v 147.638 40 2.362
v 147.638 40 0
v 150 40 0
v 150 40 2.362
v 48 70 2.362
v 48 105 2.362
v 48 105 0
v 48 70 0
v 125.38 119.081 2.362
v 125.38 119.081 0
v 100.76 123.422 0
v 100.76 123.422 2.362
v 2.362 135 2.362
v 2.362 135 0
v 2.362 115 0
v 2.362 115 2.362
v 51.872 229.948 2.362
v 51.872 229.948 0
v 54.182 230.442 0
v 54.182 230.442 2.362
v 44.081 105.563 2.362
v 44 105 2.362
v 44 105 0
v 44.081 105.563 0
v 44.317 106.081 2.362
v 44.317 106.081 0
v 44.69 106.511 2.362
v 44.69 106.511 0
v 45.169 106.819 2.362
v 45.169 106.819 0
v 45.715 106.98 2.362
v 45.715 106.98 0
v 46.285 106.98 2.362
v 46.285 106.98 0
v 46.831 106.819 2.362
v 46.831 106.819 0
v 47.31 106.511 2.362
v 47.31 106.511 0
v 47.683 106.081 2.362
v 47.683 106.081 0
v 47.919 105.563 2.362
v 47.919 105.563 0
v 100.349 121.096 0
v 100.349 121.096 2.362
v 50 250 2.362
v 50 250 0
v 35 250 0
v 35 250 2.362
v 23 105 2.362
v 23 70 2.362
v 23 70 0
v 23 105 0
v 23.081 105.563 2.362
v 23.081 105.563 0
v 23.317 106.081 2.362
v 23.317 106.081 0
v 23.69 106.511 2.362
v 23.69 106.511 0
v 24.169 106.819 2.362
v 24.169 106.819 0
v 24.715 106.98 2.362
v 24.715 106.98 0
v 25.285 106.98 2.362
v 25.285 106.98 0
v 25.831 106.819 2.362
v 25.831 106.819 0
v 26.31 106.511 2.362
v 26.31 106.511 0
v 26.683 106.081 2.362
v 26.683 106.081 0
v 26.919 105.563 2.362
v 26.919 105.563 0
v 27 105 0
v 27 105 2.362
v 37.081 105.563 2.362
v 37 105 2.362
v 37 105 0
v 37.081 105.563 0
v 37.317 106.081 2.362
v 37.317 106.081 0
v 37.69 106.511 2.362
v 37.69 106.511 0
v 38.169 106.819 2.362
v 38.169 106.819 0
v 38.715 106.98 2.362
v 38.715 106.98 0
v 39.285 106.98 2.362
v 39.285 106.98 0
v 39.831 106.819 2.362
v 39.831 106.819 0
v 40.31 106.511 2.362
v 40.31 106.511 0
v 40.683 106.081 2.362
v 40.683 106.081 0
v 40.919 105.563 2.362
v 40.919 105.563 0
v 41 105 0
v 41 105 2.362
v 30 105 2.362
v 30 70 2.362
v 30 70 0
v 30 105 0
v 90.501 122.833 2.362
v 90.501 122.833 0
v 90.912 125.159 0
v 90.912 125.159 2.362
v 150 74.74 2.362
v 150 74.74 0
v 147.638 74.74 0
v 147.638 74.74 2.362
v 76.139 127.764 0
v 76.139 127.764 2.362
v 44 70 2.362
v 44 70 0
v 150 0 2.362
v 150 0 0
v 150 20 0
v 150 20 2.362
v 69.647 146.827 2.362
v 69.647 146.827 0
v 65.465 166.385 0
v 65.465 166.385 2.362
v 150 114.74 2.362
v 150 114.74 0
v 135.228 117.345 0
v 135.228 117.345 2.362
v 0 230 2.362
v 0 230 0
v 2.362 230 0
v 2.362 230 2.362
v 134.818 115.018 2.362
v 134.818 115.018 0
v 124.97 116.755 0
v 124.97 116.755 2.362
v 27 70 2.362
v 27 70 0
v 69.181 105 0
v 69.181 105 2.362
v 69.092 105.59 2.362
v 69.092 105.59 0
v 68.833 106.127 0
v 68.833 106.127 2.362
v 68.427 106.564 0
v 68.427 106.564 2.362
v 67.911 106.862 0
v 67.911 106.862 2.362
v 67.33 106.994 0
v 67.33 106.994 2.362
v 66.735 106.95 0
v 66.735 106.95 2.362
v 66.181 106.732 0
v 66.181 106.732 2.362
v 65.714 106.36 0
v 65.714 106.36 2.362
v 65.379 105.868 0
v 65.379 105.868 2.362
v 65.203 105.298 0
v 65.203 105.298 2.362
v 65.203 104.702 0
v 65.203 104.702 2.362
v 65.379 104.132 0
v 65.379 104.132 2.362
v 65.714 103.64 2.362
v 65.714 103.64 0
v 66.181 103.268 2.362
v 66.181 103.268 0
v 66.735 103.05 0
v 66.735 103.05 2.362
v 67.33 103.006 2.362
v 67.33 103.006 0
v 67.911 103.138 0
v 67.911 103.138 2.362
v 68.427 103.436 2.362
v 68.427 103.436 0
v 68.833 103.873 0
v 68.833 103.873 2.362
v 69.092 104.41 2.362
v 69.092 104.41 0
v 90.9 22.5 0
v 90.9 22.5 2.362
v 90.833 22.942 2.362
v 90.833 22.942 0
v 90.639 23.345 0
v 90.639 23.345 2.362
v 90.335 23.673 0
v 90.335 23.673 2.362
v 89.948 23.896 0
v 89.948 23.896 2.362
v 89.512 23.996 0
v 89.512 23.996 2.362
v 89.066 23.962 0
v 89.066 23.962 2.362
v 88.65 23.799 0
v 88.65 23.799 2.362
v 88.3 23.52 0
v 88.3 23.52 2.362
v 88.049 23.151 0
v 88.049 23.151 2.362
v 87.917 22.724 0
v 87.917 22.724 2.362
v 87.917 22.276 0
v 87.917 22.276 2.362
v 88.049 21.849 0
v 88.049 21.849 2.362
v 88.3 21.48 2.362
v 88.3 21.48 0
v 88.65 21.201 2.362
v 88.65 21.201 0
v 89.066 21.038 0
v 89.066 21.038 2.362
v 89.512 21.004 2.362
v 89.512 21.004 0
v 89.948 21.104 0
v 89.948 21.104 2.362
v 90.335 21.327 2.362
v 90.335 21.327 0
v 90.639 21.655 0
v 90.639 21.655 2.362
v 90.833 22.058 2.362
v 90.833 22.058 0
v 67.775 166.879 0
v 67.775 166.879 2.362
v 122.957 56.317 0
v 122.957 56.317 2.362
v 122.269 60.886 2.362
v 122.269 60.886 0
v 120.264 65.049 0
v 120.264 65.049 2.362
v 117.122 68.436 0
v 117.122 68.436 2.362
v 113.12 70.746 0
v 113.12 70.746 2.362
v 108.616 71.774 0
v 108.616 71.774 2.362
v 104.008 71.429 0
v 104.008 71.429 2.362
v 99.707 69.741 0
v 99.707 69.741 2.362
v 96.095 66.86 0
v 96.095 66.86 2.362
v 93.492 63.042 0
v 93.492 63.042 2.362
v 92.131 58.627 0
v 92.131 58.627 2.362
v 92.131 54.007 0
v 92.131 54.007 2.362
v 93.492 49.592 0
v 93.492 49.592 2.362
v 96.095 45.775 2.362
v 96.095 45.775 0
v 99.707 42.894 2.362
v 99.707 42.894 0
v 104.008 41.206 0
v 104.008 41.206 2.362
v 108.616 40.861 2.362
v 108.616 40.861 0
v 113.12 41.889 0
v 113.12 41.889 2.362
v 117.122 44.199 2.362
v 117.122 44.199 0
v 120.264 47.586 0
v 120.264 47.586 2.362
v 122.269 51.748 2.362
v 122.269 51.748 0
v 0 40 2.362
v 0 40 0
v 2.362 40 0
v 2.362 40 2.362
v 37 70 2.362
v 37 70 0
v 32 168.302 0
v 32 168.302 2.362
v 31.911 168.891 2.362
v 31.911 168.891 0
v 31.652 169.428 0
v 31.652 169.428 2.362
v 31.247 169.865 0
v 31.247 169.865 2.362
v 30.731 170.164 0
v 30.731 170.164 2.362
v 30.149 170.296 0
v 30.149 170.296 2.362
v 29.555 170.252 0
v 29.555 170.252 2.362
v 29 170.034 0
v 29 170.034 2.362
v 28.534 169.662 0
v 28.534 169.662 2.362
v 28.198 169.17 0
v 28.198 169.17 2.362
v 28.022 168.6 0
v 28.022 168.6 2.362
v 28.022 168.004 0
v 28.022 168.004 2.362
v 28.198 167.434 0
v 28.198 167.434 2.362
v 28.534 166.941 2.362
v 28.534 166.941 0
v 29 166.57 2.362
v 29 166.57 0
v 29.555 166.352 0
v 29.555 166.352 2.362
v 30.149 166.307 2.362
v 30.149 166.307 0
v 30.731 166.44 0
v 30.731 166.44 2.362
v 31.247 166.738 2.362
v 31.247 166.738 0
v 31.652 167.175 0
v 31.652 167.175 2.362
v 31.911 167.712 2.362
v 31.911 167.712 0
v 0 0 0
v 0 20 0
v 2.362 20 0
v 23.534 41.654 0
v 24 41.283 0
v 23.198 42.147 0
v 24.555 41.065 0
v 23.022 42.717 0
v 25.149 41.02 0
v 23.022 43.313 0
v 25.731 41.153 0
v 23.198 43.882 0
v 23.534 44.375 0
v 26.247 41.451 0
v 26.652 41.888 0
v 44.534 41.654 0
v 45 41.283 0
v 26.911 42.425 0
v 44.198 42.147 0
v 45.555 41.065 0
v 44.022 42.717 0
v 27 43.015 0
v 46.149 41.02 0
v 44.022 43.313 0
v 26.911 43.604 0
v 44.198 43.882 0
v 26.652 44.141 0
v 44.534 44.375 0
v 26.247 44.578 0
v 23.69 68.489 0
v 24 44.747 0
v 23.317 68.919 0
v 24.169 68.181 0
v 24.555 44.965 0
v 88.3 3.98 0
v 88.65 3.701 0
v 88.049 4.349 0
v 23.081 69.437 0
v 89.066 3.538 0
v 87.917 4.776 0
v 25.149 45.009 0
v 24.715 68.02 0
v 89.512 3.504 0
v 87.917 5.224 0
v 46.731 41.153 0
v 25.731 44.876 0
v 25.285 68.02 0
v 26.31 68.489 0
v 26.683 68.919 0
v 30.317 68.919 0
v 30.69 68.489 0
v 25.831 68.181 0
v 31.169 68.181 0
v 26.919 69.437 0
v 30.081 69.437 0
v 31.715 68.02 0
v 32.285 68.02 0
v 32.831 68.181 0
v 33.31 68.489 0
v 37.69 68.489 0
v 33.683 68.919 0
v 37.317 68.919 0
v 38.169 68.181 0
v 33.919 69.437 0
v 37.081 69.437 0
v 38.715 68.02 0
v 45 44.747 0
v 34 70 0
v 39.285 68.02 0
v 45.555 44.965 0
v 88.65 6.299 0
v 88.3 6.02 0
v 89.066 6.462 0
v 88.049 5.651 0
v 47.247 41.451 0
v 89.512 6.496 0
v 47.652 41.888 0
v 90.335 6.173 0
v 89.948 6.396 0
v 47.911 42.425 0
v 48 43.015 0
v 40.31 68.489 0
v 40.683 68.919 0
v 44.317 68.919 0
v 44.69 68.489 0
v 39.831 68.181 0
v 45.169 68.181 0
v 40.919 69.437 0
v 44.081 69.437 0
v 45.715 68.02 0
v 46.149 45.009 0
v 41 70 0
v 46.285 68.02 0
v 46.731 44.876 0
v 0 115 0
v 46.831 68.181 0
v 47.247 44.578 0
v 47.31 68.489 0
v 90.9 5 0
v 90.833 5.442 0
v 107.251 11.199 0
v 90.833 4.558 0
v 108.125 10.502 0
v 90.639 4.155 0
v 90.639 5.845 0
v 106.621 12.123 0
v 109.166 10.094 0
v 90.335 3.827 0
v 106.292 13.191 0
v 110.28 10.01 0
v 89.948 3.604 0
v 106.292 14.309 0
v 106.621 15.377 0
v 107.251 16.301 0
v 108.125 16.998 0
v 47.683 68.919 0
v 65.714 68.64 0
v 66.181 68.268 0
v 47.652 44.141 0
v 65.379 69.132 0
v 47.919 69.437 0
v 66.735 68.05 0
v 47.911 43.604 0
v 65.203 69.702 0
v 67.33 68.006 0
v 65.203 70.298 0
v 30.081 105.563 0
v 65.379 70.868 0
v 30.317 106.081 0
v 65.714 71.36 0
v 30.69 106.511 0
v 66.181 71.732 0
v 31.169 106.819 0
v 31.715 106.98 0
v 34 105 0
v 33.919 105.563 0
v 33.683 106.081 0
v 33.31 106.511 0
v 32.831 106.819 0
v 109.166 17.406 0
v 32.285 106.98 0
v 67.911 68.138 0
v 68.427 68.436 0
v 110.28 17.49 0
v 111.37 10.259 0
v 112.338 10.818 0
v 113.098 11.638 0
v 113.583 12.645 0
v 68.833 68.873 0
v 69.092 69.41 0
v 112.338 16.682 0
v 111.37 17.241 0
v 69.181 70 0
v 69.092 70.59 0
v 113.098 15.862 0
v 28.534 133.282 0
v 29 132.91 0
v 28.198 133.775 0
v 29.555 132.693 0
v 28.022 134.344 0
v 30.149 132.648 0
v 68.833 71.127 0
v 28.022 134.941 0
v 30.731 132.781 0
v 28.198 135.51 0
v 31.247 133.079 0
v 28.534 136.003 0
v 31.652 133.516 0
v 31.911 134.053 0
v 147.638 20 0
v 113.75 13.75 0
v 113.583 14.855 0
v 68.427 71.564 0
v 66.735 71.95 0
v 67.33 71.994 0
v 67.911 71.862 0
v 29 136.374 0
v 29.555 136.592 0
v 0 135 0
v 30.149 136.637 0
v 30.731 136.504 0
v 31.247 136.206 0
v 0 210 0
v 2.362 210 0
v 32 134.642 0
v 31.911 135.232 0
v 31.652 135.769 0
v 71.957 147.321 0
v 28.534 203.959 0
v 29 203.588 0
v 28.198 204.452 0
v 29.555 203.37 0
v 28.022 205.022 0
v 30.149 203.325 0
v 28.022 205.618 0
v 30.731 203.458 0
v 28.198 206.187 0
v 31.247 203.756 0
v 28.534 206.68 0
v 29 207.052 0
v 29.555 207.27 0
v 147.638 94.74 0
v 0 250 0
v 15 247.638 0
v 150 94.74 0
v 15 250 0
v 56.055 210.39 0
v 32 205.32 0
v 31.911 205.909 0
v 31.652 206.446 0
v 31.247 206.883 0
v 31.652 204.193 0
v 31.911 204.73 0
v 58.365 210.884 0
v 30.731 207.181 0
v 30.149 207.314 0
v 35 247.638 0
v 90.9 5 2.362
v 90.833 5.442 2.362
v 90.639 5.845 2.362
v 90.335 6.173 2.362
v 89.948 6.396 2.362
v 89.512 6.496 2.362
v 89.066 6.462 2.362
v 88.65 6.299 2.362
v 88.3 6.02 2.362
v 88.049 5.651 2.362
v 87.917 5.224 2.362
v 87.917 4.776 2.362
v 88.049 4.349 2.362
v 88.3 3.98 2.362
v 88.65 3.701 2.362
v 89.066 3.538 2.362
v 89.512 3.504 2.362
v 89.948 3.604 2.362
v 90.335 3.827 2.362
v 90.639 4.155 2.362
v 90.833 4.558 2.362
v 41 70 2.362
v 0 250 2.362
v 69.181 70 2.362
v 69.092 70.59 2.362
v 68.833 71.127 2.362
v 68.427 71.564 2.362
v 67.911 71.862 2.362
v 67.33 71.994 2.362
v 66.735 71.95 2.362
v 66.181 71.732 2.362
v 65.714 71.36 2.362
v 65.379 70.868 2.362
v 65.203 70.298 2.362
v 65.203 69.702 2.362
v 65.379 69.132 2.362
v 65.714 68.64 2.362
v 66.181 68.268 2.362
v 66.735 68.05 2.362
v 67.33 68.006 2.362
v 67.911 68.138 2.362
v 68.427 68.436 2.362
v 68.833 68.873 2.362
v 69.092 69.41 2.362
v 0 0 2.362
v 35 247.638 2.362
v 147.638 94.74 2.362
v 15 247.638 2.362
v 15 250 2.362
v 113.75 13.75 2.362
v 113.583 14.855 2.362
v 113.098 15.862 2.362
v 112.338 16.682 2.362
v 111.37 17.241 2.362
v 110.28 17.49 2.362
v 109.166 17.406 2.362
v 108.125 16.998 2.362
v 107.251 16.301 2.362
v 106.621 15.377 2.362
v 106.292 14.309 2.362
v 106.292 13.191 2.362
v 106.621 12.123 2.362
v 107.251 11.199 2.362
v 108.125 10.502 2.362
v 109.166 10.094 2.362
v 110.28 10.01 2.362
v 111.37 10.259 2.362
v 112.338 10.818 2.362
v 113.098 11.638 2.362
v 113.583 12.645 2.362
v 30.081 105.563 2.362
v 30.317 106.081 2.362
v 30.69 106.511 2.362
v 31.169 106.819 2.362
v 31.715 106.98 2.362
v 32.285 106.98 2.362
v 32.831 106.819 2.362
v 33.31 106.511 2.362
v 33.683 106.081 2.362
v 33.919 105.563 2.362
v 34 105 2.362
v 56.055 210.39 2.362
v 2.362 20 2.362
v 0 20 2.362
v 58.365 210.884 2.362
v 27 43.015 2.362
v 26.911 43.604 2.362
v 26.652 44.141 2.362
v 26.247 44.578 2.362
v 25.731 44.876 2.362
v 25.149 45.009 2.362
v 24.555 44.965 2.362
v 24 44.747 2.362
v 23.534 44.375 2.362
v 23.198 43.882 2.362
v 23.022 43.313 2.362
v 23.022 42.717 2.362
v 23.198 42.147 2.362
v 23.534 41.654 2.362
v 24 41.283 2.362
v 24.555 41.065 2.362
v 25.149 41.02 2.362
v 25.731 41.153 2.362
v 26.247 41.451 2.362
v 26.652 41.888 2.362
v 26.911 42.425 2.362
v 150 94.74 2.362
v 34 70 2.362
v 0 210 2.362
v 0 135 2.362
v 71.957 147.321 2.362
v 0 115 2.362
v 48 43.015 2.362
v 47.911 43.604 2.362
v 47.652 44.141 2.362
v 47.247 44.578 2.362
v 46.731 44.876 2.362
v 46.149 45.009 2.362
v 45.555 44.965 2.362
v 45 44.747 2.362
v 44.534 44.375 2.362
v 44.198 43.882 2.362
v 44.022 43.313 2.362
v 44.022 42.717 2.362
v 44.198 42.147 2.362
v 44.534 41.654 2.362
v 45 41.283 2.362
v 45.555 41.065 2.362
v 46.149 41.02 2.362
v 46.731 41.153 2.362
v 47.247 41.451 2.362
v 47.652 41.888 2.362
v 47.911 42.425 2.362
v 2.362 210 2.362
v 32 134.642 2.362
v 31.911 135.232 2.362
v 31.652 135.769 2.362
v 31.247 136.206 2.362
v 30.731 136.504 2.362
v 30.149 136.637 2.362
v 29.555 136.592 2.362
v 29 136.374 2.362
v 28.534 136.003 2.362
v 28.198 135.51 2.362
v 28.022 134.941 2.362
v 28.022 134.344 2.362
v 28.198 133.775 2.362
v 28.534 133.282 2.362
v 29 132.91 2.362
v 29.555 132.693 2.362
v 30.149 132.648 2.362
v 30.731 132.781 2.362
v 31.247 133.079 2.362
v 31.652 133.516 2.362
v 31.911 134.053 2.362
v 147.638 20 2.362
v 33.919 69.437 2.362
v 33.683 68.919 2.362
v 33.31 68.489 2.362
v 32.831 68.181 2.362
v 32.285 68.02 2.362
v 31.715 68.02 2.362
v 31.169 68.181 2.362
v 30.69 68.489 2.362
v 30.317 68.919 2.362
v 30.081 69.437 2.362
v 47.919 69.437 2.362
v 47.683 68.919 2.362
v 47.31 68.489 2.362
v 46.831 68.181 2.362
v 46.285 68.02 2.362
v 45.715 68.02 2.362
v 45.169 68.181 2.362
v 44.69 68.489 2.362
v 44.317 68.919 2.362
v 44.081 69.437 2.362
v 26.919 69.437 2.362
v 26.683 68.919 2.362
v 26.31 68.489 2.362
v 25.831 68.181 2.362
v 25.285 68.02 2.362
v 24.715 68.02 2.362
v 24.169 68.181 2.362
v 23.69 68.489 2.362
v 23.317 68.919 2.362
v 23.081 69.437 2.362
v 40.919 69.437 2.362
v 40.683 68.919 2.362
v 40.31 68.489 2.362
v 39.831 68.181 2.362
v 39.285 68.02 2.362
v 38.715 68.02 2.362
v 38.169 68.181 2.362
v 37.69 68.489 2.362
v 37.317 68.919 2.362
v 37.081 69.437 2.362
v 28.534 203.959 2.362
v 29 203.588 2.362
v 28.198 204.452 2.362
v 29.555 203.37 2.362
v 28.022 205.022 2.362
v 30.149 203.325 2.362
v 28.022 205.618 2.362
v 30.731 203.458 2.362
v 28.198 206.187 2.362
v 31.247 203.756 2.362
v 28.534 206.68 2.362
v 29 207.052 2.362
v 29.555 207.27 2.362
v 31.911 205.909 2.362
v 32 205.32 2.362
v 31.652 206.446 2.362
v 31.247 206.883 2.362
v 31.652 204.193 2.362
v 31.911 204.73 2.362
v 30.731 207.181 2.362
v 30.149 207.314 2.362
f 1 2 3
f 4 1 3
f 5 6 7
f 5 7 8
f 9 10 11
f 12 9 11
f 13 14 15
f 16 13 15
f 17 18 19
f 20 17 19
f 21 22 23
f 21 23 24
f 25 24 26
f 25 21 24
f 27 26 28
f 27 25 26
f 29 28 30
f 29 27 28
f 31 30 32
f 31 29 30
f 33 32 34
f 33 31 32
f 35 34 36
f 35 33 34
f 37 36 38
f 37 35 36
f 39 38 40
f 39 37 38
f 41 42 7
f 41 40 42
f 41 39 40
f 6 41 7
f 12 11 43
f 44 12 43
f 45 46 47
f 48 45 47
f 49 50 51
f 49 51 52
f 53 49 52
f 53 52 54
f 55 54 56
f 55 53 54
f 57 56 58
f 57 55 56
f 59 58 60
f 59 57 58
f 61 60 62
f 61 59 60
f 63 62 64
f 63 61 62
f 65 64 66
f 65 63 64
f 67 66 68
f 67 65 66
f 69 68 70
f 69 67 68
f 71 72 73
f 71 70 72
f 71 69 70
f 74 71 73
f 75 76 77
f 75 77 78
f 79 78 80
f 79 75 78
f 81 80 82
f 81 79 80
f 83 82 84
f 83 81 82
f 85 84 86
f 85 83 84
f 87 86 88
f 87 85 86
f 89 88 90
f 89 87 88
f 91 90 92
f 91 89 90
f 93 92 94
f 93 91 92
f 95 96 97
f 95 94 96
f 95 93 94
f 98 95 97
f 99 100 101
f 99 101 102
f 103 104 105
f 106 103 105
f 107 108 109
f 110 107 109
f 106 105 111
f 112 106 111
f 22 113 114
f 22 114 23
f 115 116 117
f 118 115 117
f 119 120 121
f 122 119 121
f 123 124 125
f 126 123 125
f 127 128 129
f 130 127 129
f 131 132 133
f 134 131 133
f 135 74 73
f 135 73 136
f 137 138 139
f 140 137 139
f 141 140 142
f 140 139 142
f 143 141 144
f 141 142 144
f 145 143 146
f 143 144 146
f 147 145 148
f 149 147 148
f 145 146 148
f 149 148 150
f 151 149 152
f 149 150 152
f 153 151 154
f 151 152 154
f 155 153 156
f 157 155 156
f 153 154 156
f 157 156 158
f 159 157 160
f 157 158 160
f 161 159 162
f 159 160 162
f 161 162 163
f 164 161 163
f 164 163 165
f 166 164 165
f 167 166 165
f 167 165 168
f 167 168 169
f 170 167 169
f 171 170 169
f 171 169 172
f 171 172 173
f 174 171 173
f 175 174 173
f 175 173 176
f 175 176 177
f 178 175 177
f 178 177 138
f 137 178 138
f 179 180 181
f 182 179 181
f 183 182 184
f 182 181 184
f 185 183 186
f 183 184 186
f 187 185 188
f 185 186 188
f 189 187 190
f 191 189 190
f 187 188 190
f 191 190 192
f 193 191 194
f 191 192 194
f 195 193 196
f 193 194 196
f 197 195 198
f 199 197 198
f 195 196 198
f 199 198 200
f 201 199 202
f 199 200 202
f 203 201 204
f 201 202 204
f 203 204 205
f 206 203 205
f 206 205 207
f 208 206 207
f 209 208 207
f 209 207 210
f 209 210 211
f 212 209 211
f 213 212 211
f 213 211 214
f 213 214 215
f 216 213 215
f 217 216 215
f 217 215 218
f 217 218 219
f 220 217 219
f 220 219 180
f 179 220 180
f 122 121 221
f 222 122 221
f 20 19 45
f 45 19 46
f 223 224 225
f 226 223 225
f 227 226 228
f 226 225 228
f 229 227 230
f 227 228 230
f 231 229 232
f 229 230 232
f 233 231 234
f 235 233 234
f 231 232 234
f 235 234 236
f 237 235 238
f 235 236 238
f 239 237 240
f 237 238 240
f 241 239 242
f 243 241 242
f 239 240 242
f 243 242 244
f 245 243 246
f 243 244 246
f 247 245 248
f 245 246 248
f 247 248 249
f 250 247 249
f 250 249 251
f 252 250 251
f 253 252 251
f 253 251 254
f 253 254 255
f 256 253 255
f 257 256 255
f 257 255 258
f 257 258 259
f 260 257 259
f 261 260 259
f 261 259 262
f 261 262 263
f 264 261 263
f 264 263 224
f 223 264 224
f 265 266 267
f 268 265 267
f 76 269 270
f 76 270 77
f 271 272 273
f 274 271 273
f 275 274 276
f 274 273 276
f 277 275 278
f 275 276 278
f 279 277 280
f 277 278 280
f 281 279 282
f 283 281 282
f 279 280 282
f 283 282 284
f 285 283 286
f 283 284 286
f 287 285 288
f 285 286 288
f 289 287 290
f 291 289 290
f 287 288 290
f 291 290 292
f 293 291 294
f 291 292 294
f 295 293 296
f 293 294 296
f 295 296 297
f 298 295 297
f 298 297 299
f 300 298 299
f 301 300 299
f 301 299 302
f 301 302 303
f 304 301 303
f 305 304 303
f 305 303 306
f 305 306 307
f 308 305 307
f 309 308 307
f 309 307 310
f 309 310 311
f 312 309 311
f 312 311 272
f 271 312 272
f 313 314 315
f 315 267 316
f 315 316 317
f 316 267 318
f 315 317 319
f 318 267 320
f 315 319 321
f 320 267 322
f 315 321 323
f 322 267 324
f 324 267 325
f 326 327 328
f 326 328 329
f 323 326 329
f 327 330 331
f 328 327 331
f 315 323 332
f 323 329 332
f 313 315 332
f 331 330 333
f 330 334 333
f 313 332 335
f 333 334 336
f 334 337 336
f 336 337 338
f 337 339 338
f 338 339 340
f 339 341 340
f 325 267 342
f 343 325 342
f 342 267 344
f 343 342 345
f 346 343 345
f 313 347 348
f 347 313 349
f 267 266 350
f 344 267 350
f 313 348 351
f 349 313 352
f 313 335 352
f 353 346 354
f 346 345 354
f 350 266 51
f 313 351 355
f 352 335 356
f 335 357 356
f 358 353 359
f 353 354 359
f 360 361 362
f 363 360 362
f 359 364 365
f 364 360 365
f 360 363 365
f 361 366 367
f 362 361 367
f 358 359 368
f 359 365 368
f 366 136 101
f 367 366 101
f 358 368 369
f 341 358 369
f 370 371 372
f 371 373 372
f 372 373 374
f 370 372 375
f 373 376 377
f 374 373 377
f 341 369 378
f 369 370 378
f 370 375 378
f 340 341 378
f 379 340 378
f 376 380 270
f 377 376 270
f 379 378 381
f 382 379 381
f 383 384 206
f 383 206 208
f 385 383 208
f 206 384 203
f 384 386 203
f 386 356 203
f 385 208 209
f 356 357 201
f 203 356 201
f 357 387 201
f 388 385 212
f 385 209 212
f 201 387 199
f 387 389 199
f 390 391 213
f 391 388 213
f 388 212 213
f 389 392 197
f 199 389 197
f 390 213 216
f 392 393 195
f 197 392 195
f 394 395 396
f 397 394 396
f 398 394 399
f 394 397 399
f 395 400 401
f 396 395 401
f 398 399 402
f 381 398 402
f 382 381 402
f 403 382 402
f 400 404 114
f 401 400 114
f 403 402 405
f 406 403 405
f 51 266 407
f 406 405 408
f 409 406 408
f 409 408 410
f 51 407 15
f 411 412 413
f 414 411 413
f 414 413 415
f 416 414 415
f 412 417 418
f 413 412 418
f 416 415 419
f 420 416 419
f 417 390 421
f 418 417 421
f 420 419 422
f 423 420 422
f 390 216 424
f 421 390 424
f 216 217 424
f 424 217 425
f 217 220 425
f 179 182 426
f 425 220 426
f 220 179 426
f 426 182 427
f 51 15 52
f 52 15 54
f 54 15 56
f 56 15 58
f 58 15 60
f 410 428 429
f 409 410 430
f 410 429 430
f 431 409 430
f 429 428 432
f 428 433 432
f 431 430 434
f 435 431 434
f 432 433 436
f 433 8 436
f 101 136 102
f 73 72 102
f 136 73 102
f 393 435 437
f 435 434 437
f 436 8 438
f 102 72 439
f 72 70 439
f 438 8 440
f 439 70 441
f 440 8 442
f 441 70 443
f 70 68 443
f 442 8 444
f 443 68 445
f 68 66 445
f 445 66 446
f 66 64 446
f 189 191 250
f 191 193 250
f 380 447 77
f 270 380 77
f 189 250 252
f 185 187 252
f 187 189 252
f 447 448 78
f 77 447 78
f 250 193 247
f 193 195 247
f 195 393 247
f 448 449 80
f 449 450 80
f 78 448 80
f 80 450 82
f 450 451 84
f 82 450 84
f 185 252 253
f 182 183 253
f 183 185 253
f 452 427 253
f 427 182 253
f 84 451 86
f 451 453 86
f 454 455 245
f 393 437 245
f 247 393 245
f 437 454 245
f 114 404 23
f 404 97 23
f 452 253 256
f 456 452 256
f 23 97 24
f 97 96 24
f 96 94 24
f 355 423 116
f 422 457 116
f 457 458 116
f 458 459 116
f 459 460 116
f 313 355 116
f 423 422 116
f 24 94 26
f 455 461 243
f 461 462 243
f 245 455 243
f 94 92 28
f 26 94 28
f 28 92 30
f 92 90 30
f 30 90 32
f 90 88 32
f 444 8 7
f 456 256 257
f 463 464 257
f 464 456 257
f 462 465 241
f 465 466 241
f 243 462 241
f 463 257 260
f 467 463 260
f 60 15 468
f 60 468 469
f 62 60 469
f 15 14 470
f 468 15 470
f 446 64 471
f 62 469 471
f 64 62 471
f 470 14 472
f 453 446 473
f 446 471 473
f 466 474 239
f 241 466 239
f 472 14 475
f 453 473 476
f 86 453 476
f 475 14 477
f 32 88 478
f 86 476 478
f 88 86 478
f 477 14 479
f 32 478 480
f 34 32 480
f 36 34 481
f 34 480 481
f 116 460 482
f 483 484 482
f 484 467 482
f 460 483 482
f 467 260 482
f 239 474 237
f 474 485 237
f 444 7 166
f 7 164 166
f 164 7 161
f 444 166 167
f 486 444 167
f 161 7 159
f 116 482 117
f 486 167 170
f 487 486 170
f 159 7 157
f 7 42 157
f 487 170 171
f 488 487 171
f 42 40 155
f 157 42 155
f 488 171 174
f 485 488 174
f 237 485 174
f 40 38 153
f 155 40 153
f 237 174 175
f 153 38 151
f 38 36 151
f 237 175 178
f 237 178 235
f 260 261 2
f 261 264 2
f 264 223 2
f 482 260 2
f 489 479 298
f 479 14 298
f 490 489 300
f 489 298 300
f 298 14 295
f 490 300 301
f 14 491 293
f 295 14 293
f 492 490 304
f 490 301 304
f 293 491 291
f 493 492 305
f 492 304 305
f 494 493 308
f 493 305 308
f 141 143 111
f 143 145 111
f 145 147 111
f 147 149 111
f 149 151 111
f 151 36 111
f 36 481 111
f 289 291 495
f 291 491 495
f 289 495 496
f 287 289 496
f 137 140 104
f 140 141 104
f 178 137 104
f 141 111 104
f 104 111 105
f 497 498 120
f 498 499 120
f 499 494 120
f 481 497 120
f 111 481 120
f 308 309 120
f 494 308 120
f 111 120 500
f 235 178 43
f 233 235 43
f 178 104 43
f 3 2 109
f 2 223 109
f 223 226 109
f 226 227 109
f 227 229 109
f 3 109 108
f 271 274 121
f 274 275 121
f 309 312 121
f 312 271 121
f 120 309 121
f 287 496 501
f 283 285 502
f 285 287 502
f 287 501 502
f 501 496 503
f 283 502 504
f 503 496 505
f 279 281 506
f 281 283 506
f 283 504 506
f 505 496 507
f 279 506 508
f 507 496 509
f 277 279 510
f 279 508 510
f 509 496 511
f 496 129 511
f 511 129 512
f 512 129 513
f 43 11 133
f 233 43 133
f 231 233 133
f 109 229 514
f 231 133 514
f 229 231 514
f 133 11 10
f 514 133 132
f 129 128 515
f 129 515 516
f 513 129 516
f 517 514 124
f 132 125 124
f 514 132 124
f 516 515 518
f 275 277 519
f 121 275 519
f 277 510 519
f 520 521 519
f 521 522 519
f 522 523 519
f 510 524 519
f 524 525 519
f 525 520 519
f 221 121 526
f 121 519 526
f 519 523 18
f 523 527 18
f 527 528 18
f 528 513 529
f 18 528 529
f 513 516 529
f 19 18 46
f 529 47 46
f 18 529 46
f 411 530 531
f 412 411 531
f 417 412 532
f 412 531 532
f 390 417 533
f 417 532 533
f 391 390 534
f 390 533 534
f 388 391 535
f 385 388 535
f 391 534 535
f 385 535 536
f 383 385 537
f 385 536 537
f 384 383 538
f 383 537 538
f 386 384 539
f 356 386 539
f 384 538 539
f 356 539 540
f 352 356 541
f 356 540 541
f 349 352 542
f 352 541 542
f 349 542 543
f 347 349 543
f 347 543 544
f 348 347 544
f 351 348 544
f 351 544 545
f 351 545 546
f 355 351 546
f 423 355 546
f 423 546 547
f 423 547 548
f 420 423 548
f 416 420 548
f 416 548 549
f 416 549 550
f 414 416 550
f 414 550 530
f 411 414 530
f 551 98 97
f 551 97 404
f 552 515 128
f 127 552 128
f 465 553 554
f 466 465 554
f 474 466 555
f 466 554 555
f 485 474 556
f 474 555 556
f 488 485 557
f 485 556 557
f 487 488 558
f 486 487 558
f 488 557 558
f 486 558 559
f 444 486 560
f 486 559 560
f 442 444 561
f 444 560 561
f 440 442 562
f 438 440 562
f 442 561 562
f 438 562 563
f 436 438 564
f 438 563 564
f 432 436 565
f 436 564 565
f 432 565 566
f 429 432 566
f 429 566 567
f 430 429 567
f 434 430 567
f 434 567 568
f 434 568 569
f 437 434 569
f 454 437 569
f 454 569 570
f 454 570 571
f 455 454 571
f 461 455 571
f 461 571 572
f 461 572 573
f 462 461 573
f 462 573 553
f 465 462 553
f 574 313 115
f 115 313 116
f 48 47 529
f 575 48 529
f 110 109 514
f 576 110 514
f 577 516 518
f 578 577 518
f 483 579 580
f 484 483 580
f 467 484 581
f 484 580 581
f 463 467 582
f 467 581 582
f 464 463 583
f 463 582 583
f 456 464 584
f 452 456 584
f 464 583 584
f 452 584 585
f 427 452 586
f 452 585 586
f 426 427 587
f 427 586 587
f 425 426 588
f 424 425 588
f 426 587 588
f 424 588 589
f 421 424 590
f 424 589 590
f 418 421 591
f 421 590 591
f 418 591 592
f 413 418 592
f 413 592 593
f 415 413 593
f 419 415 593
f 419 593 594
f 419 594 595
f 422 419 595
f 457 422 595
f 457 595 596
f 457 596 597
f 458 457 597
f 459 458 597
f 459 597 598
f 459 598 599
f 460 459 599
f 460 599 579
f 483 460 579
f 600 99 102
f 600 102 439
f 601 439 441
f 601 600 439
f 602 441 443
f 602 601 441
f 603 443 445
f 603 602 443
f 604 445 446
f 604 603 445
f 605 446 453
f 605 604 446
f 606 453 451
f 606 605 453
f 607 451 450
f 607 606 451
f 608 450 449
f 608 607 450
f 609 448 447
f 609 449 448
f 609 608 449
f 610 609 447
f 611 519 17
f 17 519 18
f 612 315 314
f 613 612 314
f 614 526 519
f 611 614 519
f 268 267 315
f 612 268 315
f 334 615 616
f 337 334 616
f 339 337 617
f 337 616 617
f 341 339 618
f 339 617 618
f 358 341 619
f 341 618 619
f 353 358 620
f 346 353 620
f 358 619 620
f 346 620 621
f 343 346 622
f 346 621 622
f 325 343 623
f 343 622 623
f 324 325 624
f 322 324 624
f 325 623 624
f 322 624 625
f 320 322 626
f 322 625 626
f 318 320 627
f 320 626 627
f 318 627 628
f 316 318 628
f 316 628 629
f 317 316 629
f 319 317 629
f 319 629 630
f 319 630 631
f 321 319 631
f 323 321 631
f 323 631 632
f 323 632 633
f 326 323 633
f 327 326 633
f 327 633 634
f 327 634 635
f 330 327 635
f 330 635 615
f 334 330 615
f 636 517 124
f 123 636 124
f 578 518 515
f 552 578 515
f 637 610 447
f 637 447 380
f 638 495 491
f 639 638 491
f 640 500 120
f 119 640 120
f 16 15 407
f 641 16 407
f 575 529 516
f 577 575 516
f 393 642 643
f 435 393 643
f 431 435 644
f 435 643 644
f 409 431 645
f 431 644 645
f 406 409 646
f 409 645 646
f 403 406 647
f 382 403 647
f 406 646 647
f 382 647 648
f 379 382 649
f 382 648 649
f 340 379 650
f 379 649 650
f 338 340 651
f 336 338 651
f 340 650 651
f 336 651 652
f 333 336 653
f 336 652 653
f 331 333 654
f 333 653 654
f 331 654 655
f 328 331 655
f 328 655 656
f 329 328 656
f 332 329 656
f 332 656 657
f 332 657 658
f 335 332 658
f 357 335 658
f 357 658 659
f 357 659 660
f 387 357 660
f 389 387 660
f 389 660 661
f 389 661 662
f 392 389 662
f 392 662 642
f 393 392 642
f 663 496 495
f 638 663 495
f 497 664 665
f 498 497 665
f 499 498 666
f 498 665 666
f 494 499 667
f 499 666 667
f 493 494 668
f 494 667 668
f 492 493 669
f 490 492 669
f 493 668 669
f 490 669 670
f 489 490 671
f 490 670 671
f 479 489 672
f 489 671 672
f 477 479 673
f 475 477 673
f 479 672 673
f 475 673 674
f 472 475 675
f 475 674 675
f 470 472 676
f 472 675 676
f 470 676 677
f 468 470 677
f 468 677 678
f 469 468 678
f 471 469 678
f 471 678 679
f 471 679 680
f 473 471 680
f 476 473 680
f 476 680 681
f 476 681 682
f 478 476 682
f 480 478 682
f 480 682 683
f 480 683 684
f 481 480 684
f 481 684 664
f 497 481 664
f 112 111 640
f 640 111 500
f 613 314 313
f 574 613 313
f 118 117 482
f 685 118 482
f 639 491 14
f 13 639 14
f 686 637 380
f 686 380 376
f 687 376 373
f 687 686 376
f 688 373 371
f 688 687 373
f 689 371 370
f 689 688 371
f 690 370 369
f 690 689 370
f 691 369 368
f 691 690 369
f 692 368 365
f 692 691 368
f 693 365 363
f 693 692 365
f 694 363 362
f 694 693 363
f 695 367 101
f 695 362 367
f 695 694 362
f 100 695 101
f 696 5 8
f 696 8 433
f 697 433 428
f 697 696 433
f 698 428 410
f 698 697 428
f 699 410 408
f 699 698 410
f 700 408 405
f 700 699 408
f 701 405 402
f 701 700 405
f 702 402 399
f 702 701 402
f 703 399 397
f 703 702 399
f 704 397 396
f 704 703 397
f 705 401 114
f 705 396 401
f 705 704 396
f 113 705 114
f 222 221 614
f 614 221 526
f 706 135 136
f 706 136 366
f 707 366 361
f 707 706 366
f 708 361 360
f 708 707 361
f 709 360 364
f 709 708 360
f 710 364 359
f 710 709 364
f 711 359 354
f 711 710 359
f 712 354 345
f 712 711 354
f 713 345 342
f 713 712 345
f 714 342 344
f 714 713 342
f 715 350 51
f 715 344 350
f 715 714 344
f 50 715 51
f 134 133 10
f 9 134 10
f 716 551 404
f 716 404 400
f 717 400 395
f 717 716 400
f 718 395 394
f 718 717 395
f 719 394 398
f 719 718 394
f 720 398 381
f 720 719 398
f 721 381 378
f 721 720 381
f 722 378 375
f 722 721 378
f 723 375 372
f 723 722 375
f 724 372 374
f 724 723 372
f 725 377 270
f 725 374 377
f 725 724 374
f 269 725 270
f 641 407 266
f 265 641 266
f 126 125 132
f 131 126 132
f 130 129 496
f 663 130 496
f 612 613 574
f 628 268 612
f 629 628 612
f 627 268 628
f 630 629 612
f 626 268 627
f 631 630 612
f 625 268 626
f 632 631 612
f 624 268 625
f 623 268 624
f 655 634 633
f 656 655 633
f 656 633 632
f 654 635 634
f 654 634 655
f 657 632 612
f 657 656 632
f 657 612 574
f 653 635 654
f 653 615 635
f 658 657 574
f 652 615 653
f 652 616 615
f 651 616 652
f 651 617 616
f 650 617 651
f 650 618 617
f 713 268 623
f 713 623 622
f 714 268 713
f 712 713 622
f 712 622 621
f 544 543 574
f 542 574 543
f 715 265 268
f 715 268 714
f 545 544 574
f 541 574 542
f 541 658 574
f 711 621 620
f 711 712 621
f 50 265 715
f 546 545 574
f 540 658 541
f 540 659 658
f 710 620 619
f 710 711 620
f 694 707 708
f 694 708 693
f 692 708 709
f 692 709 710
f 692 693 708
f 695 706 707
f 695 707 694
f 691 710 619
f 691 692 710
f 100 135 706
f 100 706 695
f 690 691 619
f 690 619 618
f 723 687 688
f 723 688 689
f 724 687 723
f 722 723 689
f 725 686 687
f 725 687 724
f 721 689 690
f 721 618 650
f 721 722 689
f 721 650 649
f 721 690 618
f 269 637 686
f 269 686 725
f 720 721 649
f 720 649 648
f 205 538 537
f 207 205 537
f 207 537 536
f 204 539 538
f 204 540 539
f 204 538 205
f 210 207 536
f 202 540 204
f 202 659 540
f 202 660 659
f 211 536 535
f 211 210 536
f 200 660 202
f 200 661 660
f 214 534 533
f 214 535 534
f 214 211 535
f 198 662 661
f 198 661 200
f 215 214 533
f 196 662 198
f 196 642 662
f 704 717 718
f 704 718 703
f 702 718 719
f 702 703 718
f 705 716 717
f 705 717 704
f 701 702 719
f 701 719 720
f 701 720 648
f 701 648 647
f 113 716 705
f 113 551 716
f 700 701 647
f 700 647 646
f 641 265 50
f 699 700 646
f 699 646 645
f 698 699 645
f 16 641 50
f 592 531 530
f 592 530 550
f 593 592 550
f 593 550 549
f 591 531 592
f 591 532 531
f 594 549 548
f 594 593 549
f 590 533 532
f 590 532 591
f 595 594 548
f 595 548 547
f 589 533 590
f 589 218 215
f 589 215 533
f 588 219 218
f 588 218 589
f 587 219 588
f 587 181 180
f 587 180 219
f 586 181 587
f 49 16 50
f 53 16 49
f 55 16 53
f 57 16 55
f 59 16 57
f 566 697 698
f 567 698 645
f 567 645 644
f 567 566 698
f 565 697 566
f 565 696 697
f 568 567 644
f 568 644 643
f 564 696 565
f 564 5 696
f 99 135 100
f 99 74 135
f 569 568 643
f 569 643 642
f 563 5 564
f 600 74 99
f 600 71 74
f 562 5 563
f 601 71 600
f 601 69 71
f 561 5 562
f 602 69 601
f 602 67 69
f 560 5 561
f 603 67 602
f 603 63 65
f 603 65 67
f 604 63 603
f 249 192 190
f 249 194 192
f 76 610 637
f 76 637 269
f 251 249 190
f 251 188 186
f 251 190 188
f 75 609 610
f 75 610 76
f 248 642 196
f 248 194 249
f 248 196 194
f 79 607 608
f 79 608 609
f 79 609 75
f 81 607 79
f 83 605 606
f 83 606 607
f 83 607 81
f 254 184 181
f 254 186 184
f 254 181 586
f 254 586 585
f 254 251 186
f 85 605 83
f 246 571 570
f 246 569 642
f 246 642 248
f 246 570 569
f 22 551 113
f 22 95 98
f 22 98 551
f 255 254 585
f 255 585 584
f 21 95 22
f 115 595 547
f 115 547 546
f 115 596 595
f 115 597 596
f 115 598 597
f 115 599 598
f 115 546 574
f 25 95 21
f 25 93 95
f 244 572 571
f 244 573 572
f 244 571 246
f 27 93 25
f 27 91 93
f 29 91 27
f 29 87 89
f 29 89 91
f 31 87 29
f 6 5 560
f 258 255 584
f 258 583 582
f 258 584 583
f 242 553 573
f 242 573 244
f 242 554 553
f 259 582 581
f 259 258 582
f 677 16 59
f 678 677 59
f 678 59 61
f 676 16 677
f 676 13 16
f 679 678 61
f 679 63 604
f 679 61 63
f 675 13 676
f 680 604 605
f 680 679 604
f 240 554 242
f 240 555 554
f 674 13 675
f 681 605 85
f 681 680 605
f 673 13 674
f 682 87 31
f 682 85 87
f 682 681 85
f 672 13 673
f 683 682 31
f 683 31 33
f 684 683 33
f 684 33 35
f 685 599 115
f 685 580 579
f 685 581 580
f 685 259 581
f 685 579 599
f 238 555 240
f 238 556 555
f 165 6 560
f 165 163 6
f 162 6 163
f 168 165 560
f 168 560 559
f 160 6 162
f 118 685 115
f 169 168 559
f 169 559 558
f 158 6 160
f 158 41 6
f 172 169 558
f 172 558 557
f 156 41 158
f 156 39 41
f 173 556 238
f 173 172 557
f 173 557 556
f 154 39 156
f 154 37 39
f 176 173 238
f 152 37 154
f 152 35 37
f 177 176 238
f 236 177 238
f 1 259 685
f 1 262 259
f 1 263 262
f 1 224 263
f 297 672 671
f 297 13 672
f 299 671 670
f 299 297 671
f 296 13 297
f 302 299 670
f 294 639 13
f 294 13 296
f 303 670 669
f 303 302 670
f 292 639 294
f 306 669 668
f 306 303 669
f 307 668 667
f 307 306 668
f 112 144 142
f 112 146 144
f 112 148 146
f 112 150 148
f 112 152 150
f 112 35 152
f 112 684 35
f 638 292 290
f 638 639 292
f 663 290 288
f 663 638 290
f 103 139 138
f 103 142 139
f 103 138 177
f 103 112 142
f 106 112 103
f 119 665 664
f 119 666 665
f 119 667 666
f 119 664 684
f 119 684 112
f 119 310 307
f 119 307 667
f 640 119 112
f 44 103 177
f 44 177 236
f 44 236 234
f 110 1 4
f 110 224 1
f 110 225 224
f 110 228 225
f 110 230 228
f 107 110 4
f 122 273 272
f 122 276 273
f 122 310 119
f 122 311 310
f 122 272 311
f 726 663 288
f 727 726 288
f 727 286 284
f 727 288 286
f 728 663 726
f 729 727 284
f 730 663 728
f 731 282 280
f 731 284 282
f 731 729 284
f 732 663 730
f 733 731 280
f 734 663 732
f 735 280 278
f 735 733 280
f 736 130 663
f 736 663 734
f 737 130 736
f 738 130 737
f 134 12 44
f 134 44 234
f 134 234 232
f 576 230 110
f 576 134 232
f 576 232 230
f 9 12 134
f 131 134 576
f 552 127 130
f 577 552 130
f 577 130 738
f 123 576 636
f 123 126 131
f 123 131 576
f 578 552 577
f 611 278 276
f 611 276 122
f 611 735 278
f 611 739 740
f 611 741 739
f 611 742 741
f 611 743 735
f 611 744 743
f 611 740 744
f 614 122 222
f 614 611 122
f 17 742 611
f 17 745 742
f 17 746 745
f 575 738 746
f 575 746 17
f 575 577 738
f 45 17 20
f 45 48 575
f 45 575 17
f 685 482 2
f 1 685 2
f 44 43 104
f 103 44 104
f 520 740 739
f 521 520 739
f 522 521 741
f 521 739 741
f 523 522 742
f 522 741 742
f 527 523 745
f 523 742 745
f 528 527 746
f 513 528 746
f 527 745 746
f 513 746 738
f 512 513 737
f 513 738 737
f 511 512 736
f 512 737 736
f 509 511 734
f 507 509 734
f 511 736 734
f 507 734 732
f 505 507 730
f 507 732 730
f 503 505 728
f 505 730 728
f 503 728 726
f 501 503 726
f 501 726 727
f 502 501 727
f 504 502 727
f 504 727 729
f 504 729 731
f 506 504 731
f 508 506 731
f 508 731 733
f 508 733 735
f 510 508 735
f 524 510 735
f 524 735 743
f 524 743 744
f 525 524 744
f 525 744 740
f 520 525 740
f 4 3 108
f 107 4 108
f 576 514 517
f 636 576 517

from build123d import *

# Parameters (mm, degrees)
BOSS_EXTRUDE1_DEPTH = 2.3622
SKETCH2_R           = 2
SKETCH2_R_2         = 3.75
SKETCH2_R_3         = 1.5
SKETCH2_R_4         = 15.5
CUT_EXTRUDE1_DEPTH  = 292.557164187


with BuildPart() as part:
    # Sketch1 → Boss-Extrude1 (new body)
    with BuildSketch(Plane.XY):
        Polygon((0, 0), (150, 0), (150, 20), (147.6378, 20), (147.6378, 40), (150, 40), (150, 74.740014023), (147.6378, 74.740014023), (147.6378, 94.740014023), (150, 94.740014023), (150, 114.740014023), (135.227883705, 117.344736688), (134.81769198, 115.018423813), (124.969614449, 116.75490559), (125.379806175, 119.081218464), (100.759612349, 123.422422906), (100.349420624, 121.096110032), (90.501343094, 122.832591808), (90.911534819, 125.158904683), (76.139418524, 127.763627348), (71.95711156, 147.321446972), (69.647137484, 146.827474696), (65.464830521, 166.385294321), (67.774804596, 166.879266596), (58.364613928, 210.884360751), (56.054639852, 210.390388476), (51.872332888, 229.9482081), (54.182306964, 230.442180376), (50, 250), (35, 250), (35, 247.6378), (15, 247.6378), (15, 250), (0, 250), (0, 230), (2.3622, 230), (2.3622, 210), (0, 210), (0, 135), (2.3622, 135), (2.3622, 115), (0, 115), (0, 40), (2.3622, 40), (2.3622, 20), (0, 20), align=None)
    extrude(amount=BOSS_EXTRUDE1_DEPTH)

    # Sketch2 → Cut-Extrude1 (cut, through all)
    with BuildSketch(Plane.XY.offset(2.3622)):
        with Locations((30, 168.301817255)):
            Circle(SKETCH2_R)
        with Locations((67.180515984, 70)):
            Circle(SKETCH2_R)
        with Locations((46, 43.014719635)):
            Circle(SKETCH2_R)
        with Locations((67.180515984, 105)):
            Circle(SKETCH2_R)
        with Locations((25, 43.014719635)):
            Circle(SKETCH2_R)
        with Locations((30, 205.319678906)):
            Circle(SKETCH2_R)
        with Locations((30, 134.64241622)):
            Circle(SKETCH2_R)
        with Locations((110, 13.75)):
            Circle(SKETCH2_R_2)
        with Locations((89.4, 22.5)):
            Circle(SKETCH2_R_3)
        with Locations((89.4, 5)):
            Circle(SKETCH2_R_3)
        with Locations((107.457467604, 56.31719907)):
            Circle(SKETCH2_R_4)
        with BuildLine():
            Line((41, 105), (41, 70))
            ThreePointArc((41, 70), (39, 68), (37, 70))
            Line((37, 70), (37, 105))
            ThreePointArc((37, 105), (39, 107), (41, 105))
        make_face()
        with BuildLine():
            Line((48, 105), (48, 70))
            ThreePointArc((48, 70), (46, 68), (44, 70))
            Line((44, 70), (44, 105))
            ThreePointArc((44, 105), (46, 107), (48, 105))
        make_face()
        with BuildLine():
            Line((34, 105), (34, 70))
            ThreePointArc((34, 70), (32, 68), (30, 70))
            Line((30, 70), (30, 105))
            ThreePointArc((30, 105), (32, 107), (34, 105))
        make_face()
        with BuildLine():
            Line((27, 105), (27, 70))
            ThreePointArc((27, 70), (25, 68), (23, 70))
            Line((23, 70), (23, 105))
            ThreePointArc((23, 105), (25, 107), (27, 105))
        make_face()
    extrude(amount=-CUT_EXTRUDE1_DEPTH, mode=Mode.SUBTRACT)


solid = part.part
